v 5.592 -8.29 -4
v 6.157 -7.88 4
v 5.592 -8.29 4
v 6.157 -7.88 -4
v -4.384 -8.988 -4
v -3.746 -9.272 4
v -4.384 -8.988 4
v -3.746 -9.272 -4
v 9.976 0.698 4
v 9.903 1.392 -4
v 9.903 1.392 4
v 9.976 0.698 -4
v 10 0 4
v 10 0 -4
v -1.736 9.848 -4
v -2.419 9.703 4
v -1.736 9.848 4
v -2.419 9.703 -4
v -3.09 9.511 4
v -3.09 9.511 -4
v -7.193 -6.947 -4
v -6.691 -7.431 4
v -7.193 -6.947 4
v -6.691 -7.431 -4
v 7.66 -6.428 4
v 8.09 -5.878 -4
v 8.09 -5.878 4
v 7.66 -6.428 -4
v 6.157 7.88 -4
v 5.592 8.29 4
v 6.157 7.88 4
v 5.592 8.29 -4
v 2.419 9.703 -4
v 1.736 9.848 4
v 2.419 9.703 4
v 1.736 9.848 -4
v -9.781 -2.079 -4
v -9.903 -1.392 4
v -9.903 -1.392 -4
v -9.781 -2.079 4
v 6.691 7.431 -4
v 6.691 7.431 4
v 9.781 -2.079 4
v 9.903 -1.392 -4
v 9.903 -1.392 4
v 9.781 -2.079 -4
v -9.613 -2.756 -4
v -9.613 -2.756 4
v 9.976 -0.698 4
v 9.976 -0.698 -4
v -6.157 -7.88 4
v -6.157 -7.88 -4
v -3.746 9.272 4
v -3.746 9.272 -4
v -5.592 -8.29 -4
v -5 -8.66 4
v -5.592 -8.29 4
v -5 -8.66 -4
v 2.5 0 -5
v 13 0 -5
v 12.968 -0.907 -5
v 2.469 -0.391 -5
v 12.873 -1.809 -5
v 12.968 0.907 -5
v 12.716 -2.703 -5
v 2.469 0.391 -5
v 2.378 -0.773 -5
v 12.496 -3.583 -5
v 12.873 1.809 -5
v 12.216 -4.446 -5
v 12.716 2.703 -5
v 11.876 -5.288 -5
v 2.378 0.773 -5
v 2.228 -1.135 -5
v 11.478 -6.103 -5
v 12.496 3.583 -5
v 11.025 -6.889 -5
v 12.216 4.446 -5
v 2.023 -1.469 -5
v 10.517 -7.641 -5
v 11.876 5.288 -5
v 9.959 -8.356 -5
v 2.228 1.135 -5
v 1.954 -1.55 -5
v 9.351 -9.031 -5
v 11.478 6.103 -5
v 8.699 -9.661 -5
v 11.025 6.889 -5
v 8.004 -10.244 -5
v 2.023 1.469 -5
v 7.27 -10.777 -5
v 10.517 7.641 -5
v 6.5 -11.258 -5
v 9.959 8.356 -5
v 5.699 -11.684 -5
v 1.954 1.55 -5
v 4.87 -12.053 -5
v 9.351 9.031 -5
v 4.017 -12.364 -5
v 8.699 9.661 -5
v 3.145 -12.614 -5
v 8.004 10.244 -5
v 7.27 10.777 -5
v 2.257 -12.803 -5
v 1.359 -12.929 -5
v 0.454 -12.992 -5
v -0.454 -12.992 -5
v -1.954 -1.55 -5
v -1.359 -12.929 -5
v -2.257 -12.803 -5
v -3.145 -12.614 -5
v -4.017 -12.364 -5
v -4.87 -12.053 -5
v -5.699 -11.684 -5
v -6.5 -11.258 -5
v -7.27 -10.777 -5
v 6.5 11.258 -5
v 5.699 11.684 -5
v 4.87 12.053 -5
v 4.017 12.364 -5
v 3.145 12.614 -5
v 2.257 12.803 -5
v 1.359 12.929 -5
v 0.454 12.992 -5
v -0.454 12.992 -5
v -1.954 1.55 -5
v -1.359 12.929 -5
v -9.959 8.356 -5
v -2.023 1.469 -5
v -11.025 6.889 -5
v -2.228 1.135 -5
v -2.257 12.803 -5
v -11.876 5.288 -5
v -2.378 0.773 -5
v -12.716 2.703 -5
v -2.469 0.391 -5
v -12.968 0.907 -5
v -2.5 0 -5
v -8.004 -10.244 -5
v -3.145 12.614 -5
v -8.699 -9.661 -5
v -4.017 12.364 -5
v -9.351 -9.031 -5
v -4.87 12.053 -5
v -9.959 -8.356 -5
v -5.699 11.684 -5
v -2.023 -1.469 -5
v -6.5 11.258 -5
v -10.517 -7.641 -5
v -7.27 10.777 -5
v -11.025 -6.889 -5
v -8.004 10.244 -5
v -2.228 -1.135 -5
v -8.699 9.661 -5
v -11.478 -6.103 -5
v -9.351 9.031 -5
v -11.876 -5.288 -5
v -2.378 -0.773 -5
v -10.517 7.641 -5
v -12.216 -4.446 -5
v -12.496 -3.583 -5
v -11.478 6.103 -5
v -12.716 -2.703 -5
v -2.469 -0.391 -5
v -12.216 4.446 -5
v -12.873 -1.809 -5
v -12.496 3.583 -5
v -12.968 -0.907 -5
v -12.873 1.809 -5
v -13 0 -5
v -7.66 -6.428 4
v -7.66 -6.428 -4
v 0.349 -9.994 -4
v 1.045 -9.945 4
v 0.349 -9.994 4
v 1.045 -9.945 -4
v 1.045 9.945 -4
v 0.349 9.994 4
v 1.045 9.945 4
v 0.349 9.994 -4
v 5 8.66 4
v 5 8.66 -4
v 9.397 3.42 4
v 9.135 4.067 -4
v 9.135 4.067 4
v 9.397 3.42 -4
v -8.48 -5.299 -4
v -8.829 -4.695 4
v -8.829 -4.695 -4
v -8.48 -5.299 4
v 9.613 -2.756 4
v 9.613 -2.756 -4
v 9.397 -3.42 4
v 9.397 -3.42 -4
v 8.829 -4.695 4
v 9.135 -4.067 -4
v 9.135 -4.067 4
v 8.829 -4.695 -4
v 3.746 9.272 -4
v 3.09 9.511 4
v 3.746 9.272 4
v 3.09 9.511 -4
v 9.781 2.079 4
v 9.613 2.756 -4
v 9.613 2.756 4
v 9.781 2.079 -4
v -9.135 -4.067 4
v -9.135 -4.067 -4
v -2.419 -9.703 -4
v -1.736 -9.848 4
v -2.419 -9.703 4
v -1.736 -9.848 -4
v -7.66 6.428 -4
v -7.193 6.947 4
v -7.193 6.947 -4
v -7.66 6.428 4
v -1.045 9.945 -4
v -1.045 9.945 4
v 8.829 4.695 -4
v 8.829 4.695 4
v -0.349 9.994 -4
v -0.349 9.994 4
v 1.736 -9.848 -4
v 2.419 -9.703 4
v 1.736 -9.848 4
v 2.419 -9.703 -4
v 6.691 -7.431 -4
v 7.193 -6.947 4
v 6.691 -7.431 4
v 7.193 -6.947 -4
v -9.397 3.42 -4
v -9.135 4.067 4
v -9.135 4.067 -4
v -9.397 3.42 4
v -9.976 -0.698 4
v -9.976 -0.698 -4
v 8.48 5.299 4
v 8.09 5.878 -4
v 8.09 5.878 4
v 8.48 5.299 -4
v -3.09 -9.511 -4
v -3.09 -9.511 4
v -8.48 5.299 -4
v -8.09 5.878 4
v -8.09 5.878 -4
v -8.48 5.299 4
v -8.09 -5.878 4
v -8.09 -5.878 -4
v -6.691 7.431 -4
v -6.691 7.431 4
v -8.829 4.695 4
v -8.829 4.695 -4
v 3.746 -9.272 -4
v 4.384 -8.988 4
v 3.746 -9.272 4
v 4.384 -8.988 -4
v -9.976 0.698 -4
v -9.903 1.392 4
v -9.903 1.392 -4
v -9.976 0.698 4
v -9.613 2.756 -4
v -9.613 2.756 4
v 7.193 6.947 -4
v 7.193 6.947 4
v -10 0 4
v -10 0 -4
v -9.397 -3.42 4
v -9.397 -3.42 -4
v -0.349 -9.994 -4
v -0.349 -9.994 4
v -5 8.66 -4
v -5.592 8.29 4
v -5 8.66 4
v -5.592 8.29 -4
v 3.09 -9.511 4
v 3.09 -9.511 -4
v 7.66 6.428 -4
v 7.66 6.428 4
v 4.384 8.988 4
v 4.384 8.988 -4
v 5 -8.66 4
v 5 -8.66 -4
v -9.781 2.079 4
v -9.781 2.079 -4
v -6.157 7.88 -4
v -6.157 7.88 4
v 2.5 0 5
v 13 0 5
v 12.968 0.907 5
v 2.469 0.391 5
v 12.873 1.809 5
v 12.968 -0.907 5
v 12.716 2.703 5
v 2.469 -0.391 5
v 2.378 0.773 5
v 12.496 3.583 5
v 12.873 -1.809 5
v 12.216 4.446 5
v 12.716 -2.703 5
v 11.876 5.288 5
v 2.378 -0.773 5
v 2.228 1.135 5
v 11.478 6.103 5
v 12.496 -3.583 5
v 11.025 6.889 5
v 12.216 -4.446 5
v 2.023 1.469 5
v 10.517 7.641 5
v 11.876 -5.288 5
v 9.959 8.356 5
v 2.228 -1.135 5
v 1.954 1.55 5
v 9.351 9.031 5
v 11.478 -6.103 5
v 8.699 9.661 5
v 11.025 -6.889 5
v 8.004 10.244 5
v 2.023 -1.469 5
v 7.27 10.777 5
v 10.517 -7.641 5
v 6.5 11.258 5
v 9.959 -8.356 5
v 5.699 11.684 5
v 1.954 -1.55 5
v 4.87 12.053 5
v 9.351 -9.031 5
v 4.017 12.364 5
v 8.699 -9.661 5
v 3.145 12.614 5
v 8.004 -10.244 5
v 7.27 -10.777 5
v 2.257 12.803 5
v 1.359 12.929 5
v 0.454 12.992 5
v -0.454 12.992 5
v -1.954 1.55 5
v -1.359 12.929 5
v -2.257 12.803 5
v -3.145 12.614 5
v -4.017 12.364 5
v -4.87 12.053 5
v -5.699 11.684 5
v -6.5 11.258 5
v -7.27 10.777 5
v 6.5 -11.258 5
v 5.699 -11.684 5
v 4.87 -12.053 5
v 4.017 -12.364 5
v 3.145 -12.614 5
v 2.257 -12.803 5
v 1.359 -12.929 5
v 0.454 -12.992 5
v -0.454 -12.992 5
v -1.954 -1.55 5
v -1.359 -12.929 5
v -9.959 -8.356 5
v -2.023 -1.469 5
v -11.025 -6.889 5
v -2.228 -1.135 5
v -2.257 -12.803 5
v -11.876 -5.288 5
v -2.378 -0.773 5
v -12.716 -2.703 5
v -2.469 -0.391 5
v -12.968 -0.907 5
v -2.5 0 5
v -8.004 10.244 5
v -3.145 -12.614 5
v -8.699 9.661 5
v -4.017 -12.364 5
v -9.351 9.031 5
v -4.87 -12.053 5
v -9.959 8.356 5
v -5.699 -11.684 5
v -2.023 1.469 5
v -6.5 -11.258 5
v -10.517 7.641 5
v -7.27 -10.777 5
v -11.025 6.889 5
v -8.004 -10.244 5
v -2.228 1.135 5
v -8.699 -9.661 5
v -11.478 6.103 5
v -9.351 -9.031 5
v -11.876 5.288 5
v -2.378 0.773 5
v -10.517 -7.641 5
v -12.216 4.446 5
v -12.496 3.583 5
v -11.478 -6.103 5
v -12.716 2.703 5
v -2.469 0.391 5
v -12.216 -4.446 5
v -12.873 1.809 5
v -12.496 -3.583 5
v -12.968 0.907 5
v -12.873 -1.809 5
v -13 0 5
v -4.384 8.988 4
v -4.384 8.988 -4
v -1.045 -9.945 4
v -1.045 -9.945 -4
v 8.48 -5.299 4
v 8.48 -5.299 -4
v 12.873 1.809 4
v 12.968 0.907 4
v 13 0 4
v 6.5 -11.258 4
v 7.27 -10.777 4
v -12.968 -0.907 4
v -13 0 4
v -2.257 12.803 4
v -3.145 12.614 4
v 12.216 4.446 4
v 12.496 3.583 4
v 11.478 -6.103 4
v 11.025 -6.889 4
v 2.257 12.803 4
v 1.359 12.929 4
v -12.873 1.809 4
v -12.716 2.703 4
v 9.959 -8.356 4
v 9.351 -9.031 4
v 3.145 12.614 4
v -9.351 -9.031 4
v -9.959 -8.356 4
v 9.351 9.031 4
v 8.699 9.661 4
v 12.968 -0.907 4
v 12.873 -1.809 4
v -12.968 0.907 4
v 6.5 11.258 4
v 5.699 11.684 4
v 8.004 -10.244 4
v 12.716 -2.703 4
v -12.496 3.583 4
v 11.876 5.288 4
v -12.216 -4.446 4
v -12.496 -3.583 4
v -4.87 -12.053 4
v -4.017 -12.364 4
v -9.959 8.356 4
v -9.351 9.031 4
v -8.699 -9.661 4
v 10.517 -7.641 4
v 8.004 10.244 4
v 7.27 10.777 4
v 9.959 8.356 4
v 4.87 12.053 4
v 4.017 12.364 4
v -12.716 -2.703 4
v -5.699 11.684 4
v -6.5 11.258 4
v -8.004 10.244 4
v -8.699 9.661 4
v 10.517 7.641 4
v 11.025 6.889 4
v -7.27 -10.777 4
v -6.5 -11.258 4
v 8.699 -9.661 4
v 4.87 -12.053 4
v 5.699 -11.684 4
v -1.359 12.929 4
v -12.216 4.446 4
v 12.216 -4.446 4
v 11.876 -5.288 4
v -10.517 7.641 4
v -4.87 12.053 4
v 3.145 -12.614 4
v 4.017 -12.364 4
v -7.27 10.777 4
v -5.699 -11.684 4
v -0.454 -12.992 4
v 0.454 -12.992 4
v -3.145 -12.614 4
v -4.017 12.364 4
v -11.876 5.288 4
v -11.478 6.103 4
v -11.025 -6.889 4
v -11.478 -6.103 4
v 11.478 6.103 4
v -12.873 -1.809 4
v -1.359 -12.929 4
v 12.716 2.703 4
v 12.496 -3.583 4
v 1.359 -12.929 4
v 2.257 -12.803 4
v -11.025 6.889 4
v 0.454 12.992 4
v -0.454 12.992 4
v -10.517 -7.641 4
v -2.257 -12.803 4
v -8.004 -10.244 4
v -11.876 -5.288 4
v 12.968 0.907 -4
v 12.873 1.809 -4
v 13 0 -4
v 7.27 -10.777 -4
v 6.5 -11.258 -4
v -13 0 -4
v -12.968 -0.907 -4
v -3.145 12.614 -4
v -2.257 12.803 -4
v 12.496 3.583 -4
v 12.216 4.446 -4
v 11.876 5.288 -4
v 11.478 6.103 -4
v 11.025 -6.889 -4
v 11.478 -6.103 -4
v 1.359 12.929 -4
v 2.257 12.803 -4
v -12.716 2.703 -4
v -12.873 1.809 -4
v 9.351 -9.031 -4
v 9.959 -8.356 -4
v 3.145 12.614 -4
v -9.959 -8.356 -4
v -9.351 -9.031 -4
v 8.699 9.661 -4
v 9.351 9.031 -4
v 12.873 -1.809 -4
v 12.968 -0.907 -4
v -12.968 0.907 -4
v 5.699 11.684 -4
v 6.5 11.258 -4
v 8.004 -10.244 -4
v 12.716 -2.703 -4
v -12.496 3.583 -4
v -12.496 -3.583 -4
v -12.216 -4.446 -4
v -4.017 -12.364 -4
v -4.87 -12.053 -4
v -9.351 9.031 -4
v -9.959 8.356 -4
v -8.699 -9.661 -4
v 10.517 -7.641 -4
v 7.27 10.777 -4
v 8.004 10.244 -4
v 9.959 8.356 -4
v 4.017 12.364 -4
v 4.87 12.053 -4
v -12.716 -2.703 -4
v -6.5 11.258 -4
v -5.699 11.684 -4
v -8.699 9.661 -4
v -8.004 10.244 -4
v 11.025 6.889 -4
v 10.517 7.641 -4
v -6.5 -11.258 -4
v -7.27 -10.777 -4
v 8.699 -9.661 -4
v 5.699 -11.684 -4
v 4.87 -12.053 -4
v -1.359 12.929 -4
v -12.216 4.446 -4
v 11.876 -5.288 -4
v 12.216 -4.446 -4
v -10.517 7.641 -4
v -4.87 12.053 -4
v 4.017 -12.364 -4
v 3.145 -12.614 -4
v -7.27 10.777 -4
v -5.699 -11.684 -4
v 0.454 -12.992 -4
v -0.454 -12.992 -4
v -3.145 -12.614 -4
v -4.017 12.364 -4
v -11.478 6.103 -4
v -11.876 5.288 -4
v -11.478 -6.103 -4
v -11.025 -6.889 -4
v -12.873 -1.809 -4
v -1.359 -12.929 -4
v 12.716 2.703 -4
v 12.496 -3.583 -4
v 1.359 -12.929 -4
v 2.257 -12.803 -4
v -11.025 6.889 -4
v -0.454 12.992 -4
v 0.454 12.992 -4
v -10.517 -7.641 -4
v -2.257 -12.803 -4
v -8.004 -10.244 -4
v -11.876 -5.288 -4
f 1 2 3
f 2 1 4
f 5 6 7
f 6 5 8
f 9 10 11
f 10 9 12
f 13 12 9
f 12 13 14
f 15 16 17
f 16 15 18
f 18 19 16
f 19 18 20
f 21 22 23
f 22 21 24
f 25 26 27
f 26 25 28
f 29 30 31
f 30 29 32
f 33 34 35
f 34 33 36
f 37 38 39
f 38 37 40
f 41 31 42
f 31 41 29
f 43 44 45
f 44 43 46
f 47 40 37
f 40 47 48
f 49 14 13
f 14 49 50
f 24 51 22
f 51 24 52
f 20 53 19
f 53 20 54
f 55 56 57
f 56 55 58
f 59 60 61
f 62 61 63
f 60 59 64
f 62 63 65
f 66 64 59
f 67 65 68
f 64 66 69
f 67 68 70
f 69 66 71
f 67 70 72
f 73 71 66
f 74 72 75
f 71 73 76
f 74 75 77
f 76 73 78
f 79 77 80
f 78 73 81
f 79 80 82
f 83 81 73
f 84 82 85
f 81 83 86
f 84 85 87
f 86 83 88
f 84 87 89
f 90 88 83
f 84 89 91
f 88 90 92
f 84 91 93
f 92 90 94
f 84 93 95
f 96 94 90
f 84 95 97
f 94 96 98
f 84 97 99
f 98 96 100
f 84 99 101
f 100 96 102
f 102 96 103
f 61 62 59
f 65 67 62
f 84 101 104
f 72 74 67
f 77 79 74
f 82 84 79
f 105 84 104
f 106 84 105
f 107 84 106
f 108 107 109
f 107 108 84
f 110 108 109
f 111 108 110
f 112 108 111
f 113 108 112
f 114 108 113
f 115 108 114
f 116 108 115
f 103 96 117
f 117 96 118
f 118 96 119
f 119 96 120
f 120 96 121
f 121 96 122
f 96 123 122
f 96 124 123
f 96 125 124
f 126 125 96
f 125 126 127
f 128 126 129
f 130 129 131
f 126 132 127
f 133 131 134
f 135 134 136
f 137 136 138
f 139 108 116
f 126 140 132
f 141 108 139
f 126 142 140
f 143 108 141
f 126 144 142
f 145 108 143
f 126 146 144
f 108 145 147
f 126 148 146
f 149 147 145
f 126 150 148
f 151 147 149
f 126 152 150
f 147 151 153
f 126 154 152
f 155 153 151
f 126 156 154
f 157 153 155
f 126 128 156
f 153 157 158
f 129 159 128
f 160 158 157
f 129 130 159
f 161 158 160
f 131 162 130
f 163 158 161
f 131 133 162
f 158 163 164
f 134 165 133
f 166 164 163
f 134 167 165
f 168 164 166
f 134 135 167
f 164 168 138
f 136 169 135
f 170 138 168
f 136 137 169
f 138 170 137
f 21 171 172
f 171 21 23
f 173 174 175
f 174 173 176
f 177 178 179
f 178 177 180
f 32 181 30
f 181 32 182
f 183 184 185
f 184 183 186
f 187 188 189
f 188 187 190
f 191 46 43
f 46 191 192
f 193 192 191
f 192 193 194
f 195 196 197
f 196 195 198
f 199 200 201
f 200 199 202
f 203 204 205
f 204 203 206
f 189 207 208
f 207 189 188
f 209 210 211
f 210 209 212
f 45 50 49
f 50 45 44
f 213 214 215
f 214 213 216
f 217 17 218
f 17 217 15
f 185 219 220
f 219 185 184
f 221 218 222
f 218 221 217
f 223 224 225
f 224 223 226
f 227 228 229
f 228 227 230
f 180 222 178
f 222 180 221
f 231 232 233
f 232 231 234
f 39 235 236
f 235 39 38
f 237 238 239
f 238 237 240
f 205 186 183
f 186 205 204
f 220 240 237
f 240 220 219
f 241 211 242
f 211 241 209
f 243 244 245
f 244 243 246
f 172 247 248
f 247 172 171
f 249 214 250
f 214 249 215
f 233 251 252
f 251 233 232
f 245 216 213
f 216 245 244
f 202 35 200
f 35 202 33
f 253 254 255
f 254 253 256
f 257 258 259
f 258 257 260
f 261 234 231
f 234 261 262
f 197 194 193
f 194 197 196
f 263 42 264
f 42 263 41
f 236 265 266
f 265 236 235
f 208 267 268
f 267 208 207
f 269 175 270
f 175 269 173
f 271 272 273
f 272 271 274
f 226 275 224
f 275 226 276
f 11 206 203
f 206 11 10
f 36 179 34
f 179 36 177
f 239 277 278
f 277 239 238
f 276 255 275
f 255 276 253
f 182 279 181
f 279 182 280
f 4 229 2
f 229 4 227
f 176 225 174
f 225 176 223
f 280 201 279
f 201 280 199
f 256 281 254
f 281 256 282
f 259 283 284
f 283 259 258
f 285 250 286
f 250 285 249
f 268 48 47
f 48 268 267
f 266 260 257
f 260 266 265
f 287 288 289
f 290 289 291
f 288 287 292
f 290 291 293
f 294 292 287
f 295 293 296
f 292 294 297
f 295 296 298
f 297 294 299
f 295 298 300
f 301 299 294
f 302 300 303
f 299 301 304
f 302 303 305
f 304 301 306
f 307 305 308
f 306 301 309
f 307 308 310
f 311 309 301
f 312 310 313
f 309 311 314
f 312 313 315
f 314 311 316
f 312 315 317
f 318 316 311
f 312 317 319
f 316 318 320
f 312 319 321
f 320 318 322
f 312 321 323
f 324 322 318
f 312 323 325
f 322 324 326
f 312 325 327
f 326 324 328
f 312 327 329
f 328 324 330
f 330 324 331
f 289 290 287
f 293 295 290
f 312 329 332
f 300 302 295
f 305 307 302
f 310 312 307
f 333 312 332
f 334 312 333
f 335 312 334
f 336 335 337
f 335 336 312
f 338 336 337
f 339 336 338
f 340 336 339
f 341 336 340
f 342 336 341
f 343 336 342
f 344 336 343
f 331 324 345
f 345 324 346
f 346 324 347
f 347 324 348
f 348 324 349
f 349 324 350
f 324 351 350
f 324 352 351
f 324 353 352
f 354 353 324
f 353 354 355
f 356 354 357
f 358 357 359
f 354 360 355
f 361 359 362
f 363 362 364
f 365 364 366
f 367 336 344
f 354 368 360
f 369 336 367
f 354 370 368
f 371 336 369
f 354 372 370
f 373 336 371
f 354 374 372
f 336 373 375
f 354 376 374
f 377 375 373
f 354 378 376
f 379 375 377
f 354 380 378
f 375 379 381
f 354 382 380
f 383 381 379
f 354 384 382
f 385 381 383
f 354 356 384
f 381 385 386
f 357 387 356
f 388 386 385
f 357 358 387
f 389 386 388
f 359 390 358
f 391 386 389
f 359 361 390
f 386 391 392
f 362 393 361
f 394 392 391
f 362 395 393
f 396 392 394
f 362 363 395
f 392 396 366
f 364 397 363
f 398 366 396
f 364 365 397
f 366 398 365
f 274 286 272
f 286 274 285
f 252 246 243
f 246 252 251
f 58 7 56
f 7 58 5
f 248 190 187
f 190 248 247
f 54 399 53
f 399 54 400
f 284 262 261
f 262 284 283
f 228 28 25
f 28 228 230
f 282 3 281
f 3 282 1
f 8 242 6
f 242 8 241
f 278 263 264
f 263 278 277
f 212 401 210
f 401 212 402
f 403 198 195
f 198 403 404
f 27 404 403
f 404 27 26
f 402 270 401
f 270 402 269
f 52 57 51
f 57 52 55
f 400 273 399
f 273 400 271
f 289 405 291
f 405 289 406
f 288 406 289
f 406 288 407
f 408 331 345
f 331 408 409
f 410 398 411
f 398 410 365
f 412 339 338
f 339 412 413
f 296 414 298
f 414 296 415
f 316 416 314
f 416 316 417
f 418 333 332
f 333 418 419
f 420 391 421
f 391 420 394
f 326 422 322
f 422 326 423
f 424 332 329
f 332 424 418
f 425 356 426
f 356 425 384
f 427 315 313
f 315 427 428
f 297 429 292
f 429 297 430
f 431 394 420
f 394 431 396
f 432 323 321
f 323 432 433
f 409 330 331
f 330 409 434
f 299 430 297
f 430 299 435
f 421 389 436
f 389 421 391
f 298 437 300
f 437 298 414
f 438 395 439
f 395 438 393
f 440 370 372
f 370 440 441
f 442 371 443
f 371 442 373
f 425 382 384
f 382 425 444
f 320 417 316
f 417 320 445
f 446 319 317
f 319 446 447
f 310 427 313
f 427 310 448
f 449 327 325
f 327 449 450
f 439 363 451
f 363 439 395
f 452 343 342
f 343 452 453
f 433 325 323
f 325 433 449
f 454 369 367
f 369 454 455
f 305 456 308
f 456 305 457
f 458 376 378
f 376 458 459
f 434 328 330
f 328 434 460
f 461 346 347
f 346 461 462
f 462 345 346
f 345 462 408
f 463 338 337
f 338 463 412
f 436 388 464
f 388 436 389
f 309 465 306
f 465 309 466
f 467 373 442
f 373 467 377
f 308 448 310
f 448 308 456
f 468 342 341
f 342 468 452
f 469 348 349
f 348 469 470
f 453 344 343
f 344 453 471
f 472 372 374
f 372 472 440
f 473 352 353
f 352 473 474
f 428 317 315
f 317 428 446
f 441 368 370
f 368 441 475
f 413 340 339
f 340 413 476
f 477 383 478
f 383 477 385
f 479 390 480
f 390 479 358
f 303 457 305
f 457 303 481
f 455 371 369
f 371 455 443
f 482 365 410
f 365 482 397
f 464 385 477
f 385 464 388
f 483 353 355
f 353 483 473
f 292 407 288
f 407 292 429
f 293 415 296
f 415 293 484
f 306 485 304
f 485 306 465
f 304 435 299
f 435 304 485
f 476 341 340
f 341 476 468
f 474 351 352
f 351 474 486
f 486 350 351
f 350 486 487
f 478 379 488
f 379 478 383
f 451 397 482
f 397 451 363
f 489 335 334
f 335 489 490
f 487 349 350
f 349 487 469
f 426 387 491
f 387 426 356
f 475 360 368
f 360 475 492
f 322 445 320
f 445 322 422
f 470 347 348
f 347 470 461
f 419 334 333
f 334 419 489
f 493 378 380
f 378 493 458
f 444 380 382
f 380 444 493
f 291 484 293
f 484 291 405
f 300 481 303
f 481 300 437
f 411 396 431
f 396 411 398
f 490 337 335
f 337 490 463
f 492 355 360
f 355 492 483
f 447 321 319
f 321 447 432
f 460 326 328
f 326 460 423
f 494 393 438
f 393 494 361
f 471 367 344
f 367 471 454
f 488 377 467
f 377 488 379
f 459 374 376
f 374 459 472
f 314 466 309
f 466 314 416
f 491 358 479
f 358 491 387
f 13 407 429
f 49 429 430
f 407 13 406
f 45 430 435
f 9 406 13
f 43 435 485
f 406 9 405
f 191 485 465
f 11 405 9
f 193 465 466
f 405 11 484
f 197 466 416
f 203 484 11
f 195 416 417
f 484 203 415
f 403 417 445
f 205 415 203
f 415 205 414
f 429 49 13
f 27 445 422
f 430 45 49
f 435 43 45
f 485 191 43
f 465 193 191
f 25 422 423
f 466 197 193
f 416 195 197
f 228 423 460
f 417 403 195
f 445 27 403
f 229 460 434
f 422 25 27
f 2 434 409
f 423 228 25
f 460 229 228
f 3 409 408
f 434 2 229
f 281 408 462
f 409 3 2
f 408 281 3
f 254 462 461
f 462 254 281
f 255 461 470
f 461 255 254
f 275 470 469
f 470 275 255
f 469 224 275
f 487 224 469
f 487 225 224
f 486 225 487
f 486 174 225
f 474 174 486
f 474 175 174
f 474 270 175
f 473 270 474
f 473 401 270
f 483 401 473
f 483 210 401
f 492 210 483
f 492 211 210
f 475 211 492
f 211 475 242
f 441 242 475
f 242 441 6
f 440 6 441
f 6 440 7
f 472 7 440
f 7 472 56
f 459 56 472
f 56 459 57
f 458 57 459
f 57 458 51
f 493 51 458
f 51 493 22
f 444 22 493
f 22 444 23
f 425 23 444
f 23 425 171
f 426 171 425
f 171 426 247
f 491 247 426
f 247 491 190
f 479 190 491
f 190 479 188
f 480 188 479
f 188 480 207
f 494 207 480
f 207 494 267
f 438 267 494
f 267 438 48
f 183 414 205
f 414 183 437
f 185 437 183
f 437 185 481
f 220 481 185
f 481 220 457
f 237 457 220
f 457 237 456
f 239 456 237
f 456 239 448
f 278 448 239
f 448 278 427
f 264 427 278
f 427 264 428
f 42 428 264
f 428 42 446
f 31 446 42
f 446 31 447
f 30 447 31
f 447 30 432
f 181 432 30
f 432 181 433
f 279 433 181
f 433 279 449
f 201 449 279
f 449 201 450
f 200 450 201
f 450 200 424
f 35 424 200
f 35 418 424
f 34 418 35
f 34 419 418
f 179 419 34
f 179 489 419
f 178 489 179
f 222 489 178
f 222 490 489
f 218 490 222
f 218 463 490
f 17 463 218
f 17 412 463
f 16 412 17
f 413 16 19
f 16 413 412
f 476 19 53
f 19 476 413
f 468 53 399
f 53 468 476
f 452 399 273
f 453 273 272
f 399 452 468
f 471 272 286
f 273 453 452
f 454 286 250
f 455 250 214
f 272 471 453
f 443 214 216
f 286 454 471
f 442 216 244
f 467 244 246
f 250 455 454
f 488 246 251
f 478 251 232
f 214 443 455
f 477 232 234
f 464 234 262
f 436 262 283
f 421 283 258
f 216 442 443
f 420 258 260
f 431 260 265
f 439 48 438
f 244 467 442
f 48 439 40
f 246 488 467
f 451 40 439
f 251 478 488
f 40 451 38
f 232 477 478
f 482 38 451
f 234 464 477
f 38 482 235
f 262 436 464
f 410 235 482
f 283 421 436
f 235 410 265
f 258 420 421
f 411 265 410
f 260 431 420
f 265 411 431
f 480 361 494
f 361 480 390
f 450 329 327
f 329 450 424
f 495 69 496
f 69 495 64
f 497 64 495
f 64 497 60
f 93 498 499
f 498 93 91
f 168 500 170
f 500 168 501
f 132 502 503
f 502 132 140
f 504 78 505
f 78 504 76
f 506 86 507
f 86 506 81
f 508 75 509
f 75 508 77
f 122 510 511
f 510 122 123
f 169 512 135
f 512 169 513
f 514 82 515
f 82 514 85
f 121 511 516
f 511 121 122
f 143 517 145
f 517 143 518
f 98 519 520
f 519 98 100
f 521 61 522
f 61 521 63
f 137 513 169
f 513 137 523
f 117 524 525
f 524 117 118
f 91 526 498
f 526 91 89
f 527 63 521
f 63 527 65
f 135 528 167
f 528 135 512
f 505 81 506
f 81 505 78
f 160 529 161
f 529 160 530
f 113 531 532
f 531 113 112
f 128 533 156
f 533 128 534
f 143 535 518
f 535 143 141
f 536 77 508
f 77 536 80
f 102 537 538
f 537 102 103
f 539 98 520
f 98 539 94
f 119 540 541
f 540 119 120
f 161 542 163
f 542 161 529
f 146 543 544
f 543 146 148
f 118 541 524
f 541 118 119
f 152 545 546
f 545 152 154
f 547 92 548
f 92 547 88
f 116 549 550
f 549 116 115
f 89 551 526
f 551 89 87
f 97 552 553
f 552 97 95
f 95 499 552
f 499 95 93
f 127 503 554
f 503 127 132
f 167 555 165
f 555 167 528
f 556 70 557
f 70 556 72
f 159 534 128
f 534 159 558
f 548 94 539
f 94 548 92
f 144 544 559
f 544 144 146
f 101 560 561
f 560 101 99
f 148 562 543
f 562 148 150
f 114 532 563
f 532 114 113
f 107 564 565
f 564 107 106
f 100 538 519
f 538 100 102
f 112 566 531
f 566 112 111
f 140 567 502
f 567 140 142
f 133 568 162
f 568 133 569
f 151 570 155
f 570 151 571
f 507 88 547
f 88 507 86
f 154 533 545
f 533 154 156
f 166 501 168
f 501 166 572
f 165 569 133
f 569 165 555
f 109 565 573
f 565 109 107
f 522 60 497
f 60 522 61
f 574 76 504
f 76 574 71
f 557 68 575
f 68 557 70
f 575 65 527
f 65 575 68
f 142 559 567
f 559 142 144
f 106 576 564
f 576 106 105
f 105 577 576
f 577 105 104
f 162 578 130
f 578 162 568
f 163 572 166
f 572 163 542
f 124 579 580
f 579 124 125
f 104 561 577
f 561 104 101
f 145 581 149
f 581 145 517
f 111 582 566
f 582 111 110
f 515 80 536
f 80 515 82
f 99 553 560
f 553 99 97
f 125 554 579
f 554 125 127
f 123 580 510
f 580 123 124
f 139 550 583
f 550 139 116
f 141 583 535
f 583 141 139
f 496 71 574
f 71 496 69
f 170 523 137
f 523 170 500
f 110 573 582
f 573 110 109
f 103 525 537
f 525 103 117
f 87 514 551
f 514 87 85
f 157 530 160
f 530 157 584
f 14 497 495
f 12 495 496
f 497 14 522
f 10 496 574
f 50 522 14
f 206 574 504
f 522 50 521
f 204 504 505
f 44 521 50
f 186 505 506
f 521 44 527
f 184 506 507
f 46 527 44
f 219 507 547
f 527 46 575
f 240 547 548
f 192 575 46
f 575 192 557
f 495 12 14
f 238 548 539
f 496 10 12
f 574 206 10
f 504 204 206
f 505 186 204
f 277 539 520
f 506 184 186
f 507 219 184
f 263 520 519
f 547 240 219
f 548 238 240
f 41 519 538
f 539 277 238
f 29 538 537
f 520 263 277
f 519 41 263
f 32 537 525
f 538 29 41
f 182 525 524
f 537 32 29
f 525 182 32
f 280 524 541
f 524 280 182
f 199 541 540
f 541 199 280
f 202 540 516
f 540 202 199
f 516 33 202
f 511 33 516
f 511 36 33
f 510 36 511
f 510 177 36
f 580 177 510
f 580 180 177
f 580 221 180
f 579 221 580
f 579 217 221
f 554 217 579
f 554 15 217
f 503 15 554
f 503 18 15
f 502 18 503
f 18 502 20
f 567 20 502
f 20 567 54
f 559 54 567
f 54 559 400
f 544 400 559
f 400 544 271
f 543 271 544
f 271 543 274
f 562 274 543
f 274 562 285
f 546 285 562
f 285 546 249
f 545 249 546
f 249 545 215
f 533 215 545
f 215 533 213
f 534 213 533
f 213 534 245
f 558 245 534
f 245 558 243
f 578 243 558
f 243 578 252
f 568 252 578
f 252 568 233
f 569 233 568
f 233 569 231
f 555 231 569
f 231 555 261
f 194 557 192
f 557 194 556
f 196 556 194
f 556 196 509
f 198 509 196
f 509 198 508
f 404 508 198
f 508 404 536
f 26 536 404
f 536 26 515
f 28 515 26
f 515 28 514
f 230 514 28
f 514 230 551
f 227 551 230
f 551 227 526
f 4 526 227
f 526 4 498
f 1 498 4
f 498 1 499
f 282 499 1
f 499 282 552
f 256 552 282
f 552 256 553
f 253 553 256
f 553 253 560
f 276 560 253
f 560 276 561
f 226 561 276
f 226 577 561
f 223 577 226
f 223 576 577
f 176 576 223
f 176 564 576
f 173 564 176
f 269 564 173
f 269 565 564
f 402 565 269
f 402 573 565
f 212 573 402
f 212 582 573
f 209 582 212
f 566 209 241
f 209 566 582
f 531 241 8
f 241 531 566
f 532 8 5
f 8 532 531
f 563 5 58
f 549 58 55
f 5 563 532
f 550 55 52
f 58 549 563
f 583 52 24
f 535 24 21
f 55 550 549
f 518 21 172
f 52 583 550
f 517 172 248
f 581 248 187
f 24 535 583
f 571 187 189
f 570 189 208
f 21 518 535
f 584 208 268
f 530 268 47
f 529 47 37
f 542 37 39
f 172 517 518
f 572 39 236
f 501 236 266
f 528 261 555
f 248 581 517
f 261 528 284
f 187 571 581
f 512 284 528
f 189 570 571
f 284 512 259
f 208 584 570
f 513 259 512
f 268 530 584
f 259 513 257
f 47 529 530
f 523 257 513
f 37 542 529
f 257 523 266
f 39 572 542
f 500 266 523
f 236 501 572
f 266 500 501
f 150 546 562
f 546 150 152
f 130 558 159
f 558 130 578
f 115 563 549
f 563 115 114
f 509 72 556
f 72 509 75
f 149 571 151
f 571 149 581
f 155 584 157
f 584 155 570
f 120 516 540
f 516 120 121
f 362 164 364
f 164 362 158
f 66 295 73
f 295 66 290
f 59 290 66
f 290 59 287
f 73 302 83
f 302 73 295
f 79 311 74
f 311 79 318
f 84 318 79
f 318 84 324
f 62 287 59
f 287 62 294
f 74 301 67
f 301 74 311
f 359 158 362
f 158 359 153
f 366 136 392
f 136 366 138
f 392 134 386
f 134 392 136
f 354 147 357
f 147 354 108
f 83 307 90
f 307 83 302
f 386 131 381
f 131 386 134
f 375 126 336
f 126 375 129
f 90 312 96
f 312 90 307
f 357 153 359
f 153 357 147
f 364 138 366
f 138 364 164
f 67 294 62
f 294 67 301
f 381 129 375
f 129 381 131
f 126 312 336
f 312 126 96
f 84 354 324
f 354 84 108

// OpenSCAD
/*
  pully generator
  ralf baecker 2020
*/

pulley_width = 10; // mmm
pulley_axis_diameter = 5; // eg motor axis 
pilley_axis_cut = 3.1; // e.g. for stepper28BYJ
pulley_outer_diameter = 20; // outer diamter of the pulley
pulley_wall_height = 3;
pulley_wall_thickness = 1;

$fn=90;


difference() {
    union() {
        cylinder(h=pulley_width,r=(pulley_outer_diameter)/2,center=true);
        translate([0,0,(pulley_width-pulley_wall_thickness)/2])
            cylinder(h=pulley_wall_thickness,r=(pulley_outer_diameter/2)+pulley_wall_height,center=true);
        translate([0,0,-(pulley_width-pulley_wall_thickness)/2])
            cylinder(h=pulley_wall_thickness,r=(pulley_outer_diameter/2)+pulley_wall_height,center=true);
    }
//  axis_profile_round();
    axis_profile_28BYJ();
} 

module axis_profile_round() {
    cylinder(h=pulley_width+2,r=pulley_axis_diameter/2,center=true);
}

module axis_profile_28BYJ() {
    intersection() {
        cylinder(h=pulley_width+2,r=pulley_axis_diameter/2,center=true,$fn=40);
        cube([pulley_axis_diameter,pilley_axis_cut,pulley_width+2],center=true);
    }
}
